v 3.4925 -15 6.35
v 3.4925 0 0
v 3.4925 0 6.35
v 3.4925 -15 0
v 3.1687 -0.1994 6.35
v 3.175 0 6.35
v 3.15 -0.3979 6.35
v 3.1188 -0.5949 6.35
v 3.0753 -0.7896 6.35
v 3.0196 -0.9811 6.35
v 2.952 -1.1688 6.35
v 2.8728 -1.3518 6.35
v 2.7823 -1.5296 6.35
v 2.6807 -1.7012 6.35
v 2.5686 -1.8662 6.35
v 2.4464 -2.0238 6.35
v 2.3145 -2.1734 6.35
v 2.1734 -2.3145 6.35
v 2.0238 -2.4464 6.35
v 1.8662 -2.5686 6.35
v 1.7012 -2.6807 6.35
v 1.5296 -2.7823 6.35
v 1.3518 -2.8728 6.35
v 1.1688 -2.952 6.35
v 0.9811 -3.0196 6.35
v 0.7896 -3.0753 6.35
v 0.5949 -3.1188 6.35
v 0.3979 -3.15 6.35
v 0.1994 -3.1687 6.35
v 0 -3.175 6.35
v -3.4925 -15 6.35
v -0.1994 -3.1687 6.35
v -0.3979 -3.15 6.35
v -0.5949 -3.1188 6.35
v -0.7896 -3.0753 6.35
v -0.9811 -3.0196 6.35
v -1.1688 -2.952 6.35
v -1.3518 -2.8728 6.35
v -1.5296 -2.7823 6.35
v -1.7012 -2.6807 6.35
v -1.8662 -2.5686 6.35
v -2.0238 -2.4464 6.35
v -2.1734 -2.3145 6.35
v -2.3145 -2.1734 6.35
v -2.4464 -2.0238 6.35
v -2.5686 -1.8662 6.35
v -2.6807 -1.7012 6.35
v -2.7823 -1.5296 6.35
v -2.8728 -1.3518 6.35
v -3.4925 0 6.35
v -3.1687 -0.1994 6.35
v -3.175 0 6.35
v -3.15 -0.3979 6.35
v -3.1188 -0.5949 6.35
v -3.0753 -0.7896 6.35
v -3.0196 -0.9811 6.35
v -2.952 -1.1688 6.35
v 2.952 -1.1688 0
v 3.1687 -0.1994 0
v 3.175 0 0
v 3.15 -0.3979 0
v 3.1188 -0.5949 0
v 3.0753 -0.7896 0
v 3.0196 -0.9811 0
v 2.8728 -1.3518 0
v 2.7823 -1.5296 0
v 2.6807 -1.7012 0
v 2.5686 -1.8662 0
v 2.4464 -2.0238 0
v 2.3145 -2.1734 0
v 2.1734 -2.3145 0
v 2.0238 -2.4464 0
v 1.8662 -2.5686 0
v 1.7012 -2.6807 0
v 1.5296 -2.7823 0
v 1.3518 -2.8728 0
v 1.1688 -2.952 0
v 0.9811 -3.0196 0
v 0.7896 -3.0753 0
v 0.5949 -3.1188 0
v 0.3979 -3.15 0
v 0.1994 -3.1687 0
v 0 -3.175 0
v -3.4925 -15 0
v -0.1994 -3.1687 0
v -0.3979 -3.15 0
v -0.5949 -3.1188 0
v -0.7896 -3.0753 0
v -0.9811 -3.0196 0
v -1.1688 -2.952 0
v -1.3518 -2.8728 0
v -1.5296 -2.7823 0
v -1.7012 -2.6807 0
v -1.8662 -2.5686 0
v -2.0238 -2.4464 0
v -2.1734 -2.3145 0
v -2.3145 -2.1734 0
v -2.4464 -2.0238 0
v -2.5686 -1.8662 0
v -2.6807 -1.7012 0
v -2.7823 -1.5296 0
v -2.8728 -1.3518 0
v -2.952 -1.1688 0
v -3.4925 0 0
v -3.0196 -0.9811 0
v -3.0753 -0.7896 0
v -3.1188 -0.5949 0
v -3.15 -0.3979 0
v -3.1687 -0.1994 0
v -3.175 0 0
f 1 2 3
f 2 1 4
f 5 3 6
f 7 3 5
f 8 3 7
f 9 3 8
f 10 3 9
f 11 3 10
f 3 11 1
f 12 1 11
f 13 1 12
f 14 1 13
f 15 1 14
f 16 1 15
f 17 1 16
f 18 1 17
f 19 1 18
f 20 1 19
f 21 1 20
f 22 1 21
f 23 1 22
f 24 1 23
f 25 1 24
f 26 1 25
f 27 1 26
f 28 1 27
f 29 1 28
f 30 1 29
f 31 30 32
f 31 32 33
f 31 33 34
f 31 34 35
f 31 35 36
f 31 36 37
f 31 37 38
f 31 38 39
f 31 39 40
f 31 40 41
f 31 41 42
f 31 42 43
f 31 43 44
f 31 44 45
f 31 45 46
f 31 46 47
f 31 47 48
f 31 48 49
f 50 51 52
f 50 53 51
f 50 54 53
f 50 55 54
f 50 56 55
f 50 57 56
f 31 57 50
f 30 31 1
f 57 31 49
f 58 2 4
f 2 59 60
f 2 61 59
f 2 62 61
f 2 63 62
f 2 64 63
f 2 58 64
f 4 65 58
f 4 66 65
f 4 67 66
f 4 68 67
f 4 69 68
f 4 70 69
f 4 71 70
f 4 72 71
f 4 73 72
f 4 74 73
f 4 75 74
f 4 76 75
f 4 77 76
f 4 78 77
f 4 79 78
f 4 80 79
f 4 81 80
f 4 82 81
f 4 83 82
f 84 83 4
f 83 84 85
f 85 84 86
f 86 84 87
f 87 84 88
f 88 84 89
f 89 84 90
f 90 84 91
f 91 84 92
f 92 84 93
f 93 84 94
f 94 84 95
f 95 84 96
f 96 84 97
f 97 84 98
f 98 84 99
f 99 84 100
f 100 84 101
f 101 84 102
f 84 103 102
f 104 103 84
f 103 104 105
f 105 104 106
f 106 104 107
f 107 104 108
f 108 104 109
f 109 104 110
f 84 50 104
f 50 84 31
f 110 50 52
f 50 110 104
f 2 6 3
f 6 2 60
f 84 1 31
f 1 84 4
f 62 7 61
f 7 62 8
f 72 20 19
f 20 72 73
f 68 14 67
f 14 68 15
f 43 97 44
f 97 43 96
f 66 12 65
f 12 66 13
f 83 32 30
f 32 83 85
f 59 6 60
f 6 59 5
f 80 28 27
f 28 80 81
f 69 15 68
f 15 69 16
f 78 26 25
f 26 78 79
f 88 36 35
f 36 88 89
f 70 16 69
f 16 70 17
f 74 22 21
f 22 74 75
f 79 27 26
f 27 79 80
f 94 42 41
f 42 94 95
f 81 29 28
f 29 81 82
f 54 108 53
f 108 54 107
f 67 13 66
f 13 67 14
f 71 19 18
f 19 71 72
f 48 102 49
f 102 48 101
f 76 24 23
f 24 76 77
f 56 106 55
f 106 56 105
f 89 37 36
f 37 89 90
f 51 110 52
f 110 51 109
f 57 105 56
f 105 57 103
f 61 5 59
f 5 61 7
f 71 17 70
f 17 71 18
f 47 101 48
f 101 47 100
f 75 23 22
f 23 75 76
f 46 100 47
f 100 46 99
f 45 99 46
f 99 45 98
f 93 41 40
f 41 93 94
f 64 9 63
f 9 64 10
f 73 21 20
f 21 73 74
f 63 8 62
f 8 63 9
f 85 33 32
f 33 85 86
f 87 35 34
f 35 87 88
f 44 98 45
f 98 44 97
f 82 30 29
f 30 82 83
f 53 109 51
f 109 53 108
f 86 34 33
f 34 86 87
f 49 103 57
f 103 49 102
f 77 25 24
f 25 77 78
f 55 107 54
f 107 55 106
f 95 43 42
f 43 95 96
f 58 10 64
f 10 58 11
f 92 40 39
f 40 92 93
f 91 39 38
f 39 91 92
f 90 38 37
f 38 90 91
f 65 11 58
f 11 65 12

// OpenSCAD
$fn = 100;
middle = 15;
c = .25*25.4;

difference() {
    translate([0,-middle/2,c/2])
        cube([c*1.1,middle,c], center = true);
    cylinder(h=c,d=c);
}
